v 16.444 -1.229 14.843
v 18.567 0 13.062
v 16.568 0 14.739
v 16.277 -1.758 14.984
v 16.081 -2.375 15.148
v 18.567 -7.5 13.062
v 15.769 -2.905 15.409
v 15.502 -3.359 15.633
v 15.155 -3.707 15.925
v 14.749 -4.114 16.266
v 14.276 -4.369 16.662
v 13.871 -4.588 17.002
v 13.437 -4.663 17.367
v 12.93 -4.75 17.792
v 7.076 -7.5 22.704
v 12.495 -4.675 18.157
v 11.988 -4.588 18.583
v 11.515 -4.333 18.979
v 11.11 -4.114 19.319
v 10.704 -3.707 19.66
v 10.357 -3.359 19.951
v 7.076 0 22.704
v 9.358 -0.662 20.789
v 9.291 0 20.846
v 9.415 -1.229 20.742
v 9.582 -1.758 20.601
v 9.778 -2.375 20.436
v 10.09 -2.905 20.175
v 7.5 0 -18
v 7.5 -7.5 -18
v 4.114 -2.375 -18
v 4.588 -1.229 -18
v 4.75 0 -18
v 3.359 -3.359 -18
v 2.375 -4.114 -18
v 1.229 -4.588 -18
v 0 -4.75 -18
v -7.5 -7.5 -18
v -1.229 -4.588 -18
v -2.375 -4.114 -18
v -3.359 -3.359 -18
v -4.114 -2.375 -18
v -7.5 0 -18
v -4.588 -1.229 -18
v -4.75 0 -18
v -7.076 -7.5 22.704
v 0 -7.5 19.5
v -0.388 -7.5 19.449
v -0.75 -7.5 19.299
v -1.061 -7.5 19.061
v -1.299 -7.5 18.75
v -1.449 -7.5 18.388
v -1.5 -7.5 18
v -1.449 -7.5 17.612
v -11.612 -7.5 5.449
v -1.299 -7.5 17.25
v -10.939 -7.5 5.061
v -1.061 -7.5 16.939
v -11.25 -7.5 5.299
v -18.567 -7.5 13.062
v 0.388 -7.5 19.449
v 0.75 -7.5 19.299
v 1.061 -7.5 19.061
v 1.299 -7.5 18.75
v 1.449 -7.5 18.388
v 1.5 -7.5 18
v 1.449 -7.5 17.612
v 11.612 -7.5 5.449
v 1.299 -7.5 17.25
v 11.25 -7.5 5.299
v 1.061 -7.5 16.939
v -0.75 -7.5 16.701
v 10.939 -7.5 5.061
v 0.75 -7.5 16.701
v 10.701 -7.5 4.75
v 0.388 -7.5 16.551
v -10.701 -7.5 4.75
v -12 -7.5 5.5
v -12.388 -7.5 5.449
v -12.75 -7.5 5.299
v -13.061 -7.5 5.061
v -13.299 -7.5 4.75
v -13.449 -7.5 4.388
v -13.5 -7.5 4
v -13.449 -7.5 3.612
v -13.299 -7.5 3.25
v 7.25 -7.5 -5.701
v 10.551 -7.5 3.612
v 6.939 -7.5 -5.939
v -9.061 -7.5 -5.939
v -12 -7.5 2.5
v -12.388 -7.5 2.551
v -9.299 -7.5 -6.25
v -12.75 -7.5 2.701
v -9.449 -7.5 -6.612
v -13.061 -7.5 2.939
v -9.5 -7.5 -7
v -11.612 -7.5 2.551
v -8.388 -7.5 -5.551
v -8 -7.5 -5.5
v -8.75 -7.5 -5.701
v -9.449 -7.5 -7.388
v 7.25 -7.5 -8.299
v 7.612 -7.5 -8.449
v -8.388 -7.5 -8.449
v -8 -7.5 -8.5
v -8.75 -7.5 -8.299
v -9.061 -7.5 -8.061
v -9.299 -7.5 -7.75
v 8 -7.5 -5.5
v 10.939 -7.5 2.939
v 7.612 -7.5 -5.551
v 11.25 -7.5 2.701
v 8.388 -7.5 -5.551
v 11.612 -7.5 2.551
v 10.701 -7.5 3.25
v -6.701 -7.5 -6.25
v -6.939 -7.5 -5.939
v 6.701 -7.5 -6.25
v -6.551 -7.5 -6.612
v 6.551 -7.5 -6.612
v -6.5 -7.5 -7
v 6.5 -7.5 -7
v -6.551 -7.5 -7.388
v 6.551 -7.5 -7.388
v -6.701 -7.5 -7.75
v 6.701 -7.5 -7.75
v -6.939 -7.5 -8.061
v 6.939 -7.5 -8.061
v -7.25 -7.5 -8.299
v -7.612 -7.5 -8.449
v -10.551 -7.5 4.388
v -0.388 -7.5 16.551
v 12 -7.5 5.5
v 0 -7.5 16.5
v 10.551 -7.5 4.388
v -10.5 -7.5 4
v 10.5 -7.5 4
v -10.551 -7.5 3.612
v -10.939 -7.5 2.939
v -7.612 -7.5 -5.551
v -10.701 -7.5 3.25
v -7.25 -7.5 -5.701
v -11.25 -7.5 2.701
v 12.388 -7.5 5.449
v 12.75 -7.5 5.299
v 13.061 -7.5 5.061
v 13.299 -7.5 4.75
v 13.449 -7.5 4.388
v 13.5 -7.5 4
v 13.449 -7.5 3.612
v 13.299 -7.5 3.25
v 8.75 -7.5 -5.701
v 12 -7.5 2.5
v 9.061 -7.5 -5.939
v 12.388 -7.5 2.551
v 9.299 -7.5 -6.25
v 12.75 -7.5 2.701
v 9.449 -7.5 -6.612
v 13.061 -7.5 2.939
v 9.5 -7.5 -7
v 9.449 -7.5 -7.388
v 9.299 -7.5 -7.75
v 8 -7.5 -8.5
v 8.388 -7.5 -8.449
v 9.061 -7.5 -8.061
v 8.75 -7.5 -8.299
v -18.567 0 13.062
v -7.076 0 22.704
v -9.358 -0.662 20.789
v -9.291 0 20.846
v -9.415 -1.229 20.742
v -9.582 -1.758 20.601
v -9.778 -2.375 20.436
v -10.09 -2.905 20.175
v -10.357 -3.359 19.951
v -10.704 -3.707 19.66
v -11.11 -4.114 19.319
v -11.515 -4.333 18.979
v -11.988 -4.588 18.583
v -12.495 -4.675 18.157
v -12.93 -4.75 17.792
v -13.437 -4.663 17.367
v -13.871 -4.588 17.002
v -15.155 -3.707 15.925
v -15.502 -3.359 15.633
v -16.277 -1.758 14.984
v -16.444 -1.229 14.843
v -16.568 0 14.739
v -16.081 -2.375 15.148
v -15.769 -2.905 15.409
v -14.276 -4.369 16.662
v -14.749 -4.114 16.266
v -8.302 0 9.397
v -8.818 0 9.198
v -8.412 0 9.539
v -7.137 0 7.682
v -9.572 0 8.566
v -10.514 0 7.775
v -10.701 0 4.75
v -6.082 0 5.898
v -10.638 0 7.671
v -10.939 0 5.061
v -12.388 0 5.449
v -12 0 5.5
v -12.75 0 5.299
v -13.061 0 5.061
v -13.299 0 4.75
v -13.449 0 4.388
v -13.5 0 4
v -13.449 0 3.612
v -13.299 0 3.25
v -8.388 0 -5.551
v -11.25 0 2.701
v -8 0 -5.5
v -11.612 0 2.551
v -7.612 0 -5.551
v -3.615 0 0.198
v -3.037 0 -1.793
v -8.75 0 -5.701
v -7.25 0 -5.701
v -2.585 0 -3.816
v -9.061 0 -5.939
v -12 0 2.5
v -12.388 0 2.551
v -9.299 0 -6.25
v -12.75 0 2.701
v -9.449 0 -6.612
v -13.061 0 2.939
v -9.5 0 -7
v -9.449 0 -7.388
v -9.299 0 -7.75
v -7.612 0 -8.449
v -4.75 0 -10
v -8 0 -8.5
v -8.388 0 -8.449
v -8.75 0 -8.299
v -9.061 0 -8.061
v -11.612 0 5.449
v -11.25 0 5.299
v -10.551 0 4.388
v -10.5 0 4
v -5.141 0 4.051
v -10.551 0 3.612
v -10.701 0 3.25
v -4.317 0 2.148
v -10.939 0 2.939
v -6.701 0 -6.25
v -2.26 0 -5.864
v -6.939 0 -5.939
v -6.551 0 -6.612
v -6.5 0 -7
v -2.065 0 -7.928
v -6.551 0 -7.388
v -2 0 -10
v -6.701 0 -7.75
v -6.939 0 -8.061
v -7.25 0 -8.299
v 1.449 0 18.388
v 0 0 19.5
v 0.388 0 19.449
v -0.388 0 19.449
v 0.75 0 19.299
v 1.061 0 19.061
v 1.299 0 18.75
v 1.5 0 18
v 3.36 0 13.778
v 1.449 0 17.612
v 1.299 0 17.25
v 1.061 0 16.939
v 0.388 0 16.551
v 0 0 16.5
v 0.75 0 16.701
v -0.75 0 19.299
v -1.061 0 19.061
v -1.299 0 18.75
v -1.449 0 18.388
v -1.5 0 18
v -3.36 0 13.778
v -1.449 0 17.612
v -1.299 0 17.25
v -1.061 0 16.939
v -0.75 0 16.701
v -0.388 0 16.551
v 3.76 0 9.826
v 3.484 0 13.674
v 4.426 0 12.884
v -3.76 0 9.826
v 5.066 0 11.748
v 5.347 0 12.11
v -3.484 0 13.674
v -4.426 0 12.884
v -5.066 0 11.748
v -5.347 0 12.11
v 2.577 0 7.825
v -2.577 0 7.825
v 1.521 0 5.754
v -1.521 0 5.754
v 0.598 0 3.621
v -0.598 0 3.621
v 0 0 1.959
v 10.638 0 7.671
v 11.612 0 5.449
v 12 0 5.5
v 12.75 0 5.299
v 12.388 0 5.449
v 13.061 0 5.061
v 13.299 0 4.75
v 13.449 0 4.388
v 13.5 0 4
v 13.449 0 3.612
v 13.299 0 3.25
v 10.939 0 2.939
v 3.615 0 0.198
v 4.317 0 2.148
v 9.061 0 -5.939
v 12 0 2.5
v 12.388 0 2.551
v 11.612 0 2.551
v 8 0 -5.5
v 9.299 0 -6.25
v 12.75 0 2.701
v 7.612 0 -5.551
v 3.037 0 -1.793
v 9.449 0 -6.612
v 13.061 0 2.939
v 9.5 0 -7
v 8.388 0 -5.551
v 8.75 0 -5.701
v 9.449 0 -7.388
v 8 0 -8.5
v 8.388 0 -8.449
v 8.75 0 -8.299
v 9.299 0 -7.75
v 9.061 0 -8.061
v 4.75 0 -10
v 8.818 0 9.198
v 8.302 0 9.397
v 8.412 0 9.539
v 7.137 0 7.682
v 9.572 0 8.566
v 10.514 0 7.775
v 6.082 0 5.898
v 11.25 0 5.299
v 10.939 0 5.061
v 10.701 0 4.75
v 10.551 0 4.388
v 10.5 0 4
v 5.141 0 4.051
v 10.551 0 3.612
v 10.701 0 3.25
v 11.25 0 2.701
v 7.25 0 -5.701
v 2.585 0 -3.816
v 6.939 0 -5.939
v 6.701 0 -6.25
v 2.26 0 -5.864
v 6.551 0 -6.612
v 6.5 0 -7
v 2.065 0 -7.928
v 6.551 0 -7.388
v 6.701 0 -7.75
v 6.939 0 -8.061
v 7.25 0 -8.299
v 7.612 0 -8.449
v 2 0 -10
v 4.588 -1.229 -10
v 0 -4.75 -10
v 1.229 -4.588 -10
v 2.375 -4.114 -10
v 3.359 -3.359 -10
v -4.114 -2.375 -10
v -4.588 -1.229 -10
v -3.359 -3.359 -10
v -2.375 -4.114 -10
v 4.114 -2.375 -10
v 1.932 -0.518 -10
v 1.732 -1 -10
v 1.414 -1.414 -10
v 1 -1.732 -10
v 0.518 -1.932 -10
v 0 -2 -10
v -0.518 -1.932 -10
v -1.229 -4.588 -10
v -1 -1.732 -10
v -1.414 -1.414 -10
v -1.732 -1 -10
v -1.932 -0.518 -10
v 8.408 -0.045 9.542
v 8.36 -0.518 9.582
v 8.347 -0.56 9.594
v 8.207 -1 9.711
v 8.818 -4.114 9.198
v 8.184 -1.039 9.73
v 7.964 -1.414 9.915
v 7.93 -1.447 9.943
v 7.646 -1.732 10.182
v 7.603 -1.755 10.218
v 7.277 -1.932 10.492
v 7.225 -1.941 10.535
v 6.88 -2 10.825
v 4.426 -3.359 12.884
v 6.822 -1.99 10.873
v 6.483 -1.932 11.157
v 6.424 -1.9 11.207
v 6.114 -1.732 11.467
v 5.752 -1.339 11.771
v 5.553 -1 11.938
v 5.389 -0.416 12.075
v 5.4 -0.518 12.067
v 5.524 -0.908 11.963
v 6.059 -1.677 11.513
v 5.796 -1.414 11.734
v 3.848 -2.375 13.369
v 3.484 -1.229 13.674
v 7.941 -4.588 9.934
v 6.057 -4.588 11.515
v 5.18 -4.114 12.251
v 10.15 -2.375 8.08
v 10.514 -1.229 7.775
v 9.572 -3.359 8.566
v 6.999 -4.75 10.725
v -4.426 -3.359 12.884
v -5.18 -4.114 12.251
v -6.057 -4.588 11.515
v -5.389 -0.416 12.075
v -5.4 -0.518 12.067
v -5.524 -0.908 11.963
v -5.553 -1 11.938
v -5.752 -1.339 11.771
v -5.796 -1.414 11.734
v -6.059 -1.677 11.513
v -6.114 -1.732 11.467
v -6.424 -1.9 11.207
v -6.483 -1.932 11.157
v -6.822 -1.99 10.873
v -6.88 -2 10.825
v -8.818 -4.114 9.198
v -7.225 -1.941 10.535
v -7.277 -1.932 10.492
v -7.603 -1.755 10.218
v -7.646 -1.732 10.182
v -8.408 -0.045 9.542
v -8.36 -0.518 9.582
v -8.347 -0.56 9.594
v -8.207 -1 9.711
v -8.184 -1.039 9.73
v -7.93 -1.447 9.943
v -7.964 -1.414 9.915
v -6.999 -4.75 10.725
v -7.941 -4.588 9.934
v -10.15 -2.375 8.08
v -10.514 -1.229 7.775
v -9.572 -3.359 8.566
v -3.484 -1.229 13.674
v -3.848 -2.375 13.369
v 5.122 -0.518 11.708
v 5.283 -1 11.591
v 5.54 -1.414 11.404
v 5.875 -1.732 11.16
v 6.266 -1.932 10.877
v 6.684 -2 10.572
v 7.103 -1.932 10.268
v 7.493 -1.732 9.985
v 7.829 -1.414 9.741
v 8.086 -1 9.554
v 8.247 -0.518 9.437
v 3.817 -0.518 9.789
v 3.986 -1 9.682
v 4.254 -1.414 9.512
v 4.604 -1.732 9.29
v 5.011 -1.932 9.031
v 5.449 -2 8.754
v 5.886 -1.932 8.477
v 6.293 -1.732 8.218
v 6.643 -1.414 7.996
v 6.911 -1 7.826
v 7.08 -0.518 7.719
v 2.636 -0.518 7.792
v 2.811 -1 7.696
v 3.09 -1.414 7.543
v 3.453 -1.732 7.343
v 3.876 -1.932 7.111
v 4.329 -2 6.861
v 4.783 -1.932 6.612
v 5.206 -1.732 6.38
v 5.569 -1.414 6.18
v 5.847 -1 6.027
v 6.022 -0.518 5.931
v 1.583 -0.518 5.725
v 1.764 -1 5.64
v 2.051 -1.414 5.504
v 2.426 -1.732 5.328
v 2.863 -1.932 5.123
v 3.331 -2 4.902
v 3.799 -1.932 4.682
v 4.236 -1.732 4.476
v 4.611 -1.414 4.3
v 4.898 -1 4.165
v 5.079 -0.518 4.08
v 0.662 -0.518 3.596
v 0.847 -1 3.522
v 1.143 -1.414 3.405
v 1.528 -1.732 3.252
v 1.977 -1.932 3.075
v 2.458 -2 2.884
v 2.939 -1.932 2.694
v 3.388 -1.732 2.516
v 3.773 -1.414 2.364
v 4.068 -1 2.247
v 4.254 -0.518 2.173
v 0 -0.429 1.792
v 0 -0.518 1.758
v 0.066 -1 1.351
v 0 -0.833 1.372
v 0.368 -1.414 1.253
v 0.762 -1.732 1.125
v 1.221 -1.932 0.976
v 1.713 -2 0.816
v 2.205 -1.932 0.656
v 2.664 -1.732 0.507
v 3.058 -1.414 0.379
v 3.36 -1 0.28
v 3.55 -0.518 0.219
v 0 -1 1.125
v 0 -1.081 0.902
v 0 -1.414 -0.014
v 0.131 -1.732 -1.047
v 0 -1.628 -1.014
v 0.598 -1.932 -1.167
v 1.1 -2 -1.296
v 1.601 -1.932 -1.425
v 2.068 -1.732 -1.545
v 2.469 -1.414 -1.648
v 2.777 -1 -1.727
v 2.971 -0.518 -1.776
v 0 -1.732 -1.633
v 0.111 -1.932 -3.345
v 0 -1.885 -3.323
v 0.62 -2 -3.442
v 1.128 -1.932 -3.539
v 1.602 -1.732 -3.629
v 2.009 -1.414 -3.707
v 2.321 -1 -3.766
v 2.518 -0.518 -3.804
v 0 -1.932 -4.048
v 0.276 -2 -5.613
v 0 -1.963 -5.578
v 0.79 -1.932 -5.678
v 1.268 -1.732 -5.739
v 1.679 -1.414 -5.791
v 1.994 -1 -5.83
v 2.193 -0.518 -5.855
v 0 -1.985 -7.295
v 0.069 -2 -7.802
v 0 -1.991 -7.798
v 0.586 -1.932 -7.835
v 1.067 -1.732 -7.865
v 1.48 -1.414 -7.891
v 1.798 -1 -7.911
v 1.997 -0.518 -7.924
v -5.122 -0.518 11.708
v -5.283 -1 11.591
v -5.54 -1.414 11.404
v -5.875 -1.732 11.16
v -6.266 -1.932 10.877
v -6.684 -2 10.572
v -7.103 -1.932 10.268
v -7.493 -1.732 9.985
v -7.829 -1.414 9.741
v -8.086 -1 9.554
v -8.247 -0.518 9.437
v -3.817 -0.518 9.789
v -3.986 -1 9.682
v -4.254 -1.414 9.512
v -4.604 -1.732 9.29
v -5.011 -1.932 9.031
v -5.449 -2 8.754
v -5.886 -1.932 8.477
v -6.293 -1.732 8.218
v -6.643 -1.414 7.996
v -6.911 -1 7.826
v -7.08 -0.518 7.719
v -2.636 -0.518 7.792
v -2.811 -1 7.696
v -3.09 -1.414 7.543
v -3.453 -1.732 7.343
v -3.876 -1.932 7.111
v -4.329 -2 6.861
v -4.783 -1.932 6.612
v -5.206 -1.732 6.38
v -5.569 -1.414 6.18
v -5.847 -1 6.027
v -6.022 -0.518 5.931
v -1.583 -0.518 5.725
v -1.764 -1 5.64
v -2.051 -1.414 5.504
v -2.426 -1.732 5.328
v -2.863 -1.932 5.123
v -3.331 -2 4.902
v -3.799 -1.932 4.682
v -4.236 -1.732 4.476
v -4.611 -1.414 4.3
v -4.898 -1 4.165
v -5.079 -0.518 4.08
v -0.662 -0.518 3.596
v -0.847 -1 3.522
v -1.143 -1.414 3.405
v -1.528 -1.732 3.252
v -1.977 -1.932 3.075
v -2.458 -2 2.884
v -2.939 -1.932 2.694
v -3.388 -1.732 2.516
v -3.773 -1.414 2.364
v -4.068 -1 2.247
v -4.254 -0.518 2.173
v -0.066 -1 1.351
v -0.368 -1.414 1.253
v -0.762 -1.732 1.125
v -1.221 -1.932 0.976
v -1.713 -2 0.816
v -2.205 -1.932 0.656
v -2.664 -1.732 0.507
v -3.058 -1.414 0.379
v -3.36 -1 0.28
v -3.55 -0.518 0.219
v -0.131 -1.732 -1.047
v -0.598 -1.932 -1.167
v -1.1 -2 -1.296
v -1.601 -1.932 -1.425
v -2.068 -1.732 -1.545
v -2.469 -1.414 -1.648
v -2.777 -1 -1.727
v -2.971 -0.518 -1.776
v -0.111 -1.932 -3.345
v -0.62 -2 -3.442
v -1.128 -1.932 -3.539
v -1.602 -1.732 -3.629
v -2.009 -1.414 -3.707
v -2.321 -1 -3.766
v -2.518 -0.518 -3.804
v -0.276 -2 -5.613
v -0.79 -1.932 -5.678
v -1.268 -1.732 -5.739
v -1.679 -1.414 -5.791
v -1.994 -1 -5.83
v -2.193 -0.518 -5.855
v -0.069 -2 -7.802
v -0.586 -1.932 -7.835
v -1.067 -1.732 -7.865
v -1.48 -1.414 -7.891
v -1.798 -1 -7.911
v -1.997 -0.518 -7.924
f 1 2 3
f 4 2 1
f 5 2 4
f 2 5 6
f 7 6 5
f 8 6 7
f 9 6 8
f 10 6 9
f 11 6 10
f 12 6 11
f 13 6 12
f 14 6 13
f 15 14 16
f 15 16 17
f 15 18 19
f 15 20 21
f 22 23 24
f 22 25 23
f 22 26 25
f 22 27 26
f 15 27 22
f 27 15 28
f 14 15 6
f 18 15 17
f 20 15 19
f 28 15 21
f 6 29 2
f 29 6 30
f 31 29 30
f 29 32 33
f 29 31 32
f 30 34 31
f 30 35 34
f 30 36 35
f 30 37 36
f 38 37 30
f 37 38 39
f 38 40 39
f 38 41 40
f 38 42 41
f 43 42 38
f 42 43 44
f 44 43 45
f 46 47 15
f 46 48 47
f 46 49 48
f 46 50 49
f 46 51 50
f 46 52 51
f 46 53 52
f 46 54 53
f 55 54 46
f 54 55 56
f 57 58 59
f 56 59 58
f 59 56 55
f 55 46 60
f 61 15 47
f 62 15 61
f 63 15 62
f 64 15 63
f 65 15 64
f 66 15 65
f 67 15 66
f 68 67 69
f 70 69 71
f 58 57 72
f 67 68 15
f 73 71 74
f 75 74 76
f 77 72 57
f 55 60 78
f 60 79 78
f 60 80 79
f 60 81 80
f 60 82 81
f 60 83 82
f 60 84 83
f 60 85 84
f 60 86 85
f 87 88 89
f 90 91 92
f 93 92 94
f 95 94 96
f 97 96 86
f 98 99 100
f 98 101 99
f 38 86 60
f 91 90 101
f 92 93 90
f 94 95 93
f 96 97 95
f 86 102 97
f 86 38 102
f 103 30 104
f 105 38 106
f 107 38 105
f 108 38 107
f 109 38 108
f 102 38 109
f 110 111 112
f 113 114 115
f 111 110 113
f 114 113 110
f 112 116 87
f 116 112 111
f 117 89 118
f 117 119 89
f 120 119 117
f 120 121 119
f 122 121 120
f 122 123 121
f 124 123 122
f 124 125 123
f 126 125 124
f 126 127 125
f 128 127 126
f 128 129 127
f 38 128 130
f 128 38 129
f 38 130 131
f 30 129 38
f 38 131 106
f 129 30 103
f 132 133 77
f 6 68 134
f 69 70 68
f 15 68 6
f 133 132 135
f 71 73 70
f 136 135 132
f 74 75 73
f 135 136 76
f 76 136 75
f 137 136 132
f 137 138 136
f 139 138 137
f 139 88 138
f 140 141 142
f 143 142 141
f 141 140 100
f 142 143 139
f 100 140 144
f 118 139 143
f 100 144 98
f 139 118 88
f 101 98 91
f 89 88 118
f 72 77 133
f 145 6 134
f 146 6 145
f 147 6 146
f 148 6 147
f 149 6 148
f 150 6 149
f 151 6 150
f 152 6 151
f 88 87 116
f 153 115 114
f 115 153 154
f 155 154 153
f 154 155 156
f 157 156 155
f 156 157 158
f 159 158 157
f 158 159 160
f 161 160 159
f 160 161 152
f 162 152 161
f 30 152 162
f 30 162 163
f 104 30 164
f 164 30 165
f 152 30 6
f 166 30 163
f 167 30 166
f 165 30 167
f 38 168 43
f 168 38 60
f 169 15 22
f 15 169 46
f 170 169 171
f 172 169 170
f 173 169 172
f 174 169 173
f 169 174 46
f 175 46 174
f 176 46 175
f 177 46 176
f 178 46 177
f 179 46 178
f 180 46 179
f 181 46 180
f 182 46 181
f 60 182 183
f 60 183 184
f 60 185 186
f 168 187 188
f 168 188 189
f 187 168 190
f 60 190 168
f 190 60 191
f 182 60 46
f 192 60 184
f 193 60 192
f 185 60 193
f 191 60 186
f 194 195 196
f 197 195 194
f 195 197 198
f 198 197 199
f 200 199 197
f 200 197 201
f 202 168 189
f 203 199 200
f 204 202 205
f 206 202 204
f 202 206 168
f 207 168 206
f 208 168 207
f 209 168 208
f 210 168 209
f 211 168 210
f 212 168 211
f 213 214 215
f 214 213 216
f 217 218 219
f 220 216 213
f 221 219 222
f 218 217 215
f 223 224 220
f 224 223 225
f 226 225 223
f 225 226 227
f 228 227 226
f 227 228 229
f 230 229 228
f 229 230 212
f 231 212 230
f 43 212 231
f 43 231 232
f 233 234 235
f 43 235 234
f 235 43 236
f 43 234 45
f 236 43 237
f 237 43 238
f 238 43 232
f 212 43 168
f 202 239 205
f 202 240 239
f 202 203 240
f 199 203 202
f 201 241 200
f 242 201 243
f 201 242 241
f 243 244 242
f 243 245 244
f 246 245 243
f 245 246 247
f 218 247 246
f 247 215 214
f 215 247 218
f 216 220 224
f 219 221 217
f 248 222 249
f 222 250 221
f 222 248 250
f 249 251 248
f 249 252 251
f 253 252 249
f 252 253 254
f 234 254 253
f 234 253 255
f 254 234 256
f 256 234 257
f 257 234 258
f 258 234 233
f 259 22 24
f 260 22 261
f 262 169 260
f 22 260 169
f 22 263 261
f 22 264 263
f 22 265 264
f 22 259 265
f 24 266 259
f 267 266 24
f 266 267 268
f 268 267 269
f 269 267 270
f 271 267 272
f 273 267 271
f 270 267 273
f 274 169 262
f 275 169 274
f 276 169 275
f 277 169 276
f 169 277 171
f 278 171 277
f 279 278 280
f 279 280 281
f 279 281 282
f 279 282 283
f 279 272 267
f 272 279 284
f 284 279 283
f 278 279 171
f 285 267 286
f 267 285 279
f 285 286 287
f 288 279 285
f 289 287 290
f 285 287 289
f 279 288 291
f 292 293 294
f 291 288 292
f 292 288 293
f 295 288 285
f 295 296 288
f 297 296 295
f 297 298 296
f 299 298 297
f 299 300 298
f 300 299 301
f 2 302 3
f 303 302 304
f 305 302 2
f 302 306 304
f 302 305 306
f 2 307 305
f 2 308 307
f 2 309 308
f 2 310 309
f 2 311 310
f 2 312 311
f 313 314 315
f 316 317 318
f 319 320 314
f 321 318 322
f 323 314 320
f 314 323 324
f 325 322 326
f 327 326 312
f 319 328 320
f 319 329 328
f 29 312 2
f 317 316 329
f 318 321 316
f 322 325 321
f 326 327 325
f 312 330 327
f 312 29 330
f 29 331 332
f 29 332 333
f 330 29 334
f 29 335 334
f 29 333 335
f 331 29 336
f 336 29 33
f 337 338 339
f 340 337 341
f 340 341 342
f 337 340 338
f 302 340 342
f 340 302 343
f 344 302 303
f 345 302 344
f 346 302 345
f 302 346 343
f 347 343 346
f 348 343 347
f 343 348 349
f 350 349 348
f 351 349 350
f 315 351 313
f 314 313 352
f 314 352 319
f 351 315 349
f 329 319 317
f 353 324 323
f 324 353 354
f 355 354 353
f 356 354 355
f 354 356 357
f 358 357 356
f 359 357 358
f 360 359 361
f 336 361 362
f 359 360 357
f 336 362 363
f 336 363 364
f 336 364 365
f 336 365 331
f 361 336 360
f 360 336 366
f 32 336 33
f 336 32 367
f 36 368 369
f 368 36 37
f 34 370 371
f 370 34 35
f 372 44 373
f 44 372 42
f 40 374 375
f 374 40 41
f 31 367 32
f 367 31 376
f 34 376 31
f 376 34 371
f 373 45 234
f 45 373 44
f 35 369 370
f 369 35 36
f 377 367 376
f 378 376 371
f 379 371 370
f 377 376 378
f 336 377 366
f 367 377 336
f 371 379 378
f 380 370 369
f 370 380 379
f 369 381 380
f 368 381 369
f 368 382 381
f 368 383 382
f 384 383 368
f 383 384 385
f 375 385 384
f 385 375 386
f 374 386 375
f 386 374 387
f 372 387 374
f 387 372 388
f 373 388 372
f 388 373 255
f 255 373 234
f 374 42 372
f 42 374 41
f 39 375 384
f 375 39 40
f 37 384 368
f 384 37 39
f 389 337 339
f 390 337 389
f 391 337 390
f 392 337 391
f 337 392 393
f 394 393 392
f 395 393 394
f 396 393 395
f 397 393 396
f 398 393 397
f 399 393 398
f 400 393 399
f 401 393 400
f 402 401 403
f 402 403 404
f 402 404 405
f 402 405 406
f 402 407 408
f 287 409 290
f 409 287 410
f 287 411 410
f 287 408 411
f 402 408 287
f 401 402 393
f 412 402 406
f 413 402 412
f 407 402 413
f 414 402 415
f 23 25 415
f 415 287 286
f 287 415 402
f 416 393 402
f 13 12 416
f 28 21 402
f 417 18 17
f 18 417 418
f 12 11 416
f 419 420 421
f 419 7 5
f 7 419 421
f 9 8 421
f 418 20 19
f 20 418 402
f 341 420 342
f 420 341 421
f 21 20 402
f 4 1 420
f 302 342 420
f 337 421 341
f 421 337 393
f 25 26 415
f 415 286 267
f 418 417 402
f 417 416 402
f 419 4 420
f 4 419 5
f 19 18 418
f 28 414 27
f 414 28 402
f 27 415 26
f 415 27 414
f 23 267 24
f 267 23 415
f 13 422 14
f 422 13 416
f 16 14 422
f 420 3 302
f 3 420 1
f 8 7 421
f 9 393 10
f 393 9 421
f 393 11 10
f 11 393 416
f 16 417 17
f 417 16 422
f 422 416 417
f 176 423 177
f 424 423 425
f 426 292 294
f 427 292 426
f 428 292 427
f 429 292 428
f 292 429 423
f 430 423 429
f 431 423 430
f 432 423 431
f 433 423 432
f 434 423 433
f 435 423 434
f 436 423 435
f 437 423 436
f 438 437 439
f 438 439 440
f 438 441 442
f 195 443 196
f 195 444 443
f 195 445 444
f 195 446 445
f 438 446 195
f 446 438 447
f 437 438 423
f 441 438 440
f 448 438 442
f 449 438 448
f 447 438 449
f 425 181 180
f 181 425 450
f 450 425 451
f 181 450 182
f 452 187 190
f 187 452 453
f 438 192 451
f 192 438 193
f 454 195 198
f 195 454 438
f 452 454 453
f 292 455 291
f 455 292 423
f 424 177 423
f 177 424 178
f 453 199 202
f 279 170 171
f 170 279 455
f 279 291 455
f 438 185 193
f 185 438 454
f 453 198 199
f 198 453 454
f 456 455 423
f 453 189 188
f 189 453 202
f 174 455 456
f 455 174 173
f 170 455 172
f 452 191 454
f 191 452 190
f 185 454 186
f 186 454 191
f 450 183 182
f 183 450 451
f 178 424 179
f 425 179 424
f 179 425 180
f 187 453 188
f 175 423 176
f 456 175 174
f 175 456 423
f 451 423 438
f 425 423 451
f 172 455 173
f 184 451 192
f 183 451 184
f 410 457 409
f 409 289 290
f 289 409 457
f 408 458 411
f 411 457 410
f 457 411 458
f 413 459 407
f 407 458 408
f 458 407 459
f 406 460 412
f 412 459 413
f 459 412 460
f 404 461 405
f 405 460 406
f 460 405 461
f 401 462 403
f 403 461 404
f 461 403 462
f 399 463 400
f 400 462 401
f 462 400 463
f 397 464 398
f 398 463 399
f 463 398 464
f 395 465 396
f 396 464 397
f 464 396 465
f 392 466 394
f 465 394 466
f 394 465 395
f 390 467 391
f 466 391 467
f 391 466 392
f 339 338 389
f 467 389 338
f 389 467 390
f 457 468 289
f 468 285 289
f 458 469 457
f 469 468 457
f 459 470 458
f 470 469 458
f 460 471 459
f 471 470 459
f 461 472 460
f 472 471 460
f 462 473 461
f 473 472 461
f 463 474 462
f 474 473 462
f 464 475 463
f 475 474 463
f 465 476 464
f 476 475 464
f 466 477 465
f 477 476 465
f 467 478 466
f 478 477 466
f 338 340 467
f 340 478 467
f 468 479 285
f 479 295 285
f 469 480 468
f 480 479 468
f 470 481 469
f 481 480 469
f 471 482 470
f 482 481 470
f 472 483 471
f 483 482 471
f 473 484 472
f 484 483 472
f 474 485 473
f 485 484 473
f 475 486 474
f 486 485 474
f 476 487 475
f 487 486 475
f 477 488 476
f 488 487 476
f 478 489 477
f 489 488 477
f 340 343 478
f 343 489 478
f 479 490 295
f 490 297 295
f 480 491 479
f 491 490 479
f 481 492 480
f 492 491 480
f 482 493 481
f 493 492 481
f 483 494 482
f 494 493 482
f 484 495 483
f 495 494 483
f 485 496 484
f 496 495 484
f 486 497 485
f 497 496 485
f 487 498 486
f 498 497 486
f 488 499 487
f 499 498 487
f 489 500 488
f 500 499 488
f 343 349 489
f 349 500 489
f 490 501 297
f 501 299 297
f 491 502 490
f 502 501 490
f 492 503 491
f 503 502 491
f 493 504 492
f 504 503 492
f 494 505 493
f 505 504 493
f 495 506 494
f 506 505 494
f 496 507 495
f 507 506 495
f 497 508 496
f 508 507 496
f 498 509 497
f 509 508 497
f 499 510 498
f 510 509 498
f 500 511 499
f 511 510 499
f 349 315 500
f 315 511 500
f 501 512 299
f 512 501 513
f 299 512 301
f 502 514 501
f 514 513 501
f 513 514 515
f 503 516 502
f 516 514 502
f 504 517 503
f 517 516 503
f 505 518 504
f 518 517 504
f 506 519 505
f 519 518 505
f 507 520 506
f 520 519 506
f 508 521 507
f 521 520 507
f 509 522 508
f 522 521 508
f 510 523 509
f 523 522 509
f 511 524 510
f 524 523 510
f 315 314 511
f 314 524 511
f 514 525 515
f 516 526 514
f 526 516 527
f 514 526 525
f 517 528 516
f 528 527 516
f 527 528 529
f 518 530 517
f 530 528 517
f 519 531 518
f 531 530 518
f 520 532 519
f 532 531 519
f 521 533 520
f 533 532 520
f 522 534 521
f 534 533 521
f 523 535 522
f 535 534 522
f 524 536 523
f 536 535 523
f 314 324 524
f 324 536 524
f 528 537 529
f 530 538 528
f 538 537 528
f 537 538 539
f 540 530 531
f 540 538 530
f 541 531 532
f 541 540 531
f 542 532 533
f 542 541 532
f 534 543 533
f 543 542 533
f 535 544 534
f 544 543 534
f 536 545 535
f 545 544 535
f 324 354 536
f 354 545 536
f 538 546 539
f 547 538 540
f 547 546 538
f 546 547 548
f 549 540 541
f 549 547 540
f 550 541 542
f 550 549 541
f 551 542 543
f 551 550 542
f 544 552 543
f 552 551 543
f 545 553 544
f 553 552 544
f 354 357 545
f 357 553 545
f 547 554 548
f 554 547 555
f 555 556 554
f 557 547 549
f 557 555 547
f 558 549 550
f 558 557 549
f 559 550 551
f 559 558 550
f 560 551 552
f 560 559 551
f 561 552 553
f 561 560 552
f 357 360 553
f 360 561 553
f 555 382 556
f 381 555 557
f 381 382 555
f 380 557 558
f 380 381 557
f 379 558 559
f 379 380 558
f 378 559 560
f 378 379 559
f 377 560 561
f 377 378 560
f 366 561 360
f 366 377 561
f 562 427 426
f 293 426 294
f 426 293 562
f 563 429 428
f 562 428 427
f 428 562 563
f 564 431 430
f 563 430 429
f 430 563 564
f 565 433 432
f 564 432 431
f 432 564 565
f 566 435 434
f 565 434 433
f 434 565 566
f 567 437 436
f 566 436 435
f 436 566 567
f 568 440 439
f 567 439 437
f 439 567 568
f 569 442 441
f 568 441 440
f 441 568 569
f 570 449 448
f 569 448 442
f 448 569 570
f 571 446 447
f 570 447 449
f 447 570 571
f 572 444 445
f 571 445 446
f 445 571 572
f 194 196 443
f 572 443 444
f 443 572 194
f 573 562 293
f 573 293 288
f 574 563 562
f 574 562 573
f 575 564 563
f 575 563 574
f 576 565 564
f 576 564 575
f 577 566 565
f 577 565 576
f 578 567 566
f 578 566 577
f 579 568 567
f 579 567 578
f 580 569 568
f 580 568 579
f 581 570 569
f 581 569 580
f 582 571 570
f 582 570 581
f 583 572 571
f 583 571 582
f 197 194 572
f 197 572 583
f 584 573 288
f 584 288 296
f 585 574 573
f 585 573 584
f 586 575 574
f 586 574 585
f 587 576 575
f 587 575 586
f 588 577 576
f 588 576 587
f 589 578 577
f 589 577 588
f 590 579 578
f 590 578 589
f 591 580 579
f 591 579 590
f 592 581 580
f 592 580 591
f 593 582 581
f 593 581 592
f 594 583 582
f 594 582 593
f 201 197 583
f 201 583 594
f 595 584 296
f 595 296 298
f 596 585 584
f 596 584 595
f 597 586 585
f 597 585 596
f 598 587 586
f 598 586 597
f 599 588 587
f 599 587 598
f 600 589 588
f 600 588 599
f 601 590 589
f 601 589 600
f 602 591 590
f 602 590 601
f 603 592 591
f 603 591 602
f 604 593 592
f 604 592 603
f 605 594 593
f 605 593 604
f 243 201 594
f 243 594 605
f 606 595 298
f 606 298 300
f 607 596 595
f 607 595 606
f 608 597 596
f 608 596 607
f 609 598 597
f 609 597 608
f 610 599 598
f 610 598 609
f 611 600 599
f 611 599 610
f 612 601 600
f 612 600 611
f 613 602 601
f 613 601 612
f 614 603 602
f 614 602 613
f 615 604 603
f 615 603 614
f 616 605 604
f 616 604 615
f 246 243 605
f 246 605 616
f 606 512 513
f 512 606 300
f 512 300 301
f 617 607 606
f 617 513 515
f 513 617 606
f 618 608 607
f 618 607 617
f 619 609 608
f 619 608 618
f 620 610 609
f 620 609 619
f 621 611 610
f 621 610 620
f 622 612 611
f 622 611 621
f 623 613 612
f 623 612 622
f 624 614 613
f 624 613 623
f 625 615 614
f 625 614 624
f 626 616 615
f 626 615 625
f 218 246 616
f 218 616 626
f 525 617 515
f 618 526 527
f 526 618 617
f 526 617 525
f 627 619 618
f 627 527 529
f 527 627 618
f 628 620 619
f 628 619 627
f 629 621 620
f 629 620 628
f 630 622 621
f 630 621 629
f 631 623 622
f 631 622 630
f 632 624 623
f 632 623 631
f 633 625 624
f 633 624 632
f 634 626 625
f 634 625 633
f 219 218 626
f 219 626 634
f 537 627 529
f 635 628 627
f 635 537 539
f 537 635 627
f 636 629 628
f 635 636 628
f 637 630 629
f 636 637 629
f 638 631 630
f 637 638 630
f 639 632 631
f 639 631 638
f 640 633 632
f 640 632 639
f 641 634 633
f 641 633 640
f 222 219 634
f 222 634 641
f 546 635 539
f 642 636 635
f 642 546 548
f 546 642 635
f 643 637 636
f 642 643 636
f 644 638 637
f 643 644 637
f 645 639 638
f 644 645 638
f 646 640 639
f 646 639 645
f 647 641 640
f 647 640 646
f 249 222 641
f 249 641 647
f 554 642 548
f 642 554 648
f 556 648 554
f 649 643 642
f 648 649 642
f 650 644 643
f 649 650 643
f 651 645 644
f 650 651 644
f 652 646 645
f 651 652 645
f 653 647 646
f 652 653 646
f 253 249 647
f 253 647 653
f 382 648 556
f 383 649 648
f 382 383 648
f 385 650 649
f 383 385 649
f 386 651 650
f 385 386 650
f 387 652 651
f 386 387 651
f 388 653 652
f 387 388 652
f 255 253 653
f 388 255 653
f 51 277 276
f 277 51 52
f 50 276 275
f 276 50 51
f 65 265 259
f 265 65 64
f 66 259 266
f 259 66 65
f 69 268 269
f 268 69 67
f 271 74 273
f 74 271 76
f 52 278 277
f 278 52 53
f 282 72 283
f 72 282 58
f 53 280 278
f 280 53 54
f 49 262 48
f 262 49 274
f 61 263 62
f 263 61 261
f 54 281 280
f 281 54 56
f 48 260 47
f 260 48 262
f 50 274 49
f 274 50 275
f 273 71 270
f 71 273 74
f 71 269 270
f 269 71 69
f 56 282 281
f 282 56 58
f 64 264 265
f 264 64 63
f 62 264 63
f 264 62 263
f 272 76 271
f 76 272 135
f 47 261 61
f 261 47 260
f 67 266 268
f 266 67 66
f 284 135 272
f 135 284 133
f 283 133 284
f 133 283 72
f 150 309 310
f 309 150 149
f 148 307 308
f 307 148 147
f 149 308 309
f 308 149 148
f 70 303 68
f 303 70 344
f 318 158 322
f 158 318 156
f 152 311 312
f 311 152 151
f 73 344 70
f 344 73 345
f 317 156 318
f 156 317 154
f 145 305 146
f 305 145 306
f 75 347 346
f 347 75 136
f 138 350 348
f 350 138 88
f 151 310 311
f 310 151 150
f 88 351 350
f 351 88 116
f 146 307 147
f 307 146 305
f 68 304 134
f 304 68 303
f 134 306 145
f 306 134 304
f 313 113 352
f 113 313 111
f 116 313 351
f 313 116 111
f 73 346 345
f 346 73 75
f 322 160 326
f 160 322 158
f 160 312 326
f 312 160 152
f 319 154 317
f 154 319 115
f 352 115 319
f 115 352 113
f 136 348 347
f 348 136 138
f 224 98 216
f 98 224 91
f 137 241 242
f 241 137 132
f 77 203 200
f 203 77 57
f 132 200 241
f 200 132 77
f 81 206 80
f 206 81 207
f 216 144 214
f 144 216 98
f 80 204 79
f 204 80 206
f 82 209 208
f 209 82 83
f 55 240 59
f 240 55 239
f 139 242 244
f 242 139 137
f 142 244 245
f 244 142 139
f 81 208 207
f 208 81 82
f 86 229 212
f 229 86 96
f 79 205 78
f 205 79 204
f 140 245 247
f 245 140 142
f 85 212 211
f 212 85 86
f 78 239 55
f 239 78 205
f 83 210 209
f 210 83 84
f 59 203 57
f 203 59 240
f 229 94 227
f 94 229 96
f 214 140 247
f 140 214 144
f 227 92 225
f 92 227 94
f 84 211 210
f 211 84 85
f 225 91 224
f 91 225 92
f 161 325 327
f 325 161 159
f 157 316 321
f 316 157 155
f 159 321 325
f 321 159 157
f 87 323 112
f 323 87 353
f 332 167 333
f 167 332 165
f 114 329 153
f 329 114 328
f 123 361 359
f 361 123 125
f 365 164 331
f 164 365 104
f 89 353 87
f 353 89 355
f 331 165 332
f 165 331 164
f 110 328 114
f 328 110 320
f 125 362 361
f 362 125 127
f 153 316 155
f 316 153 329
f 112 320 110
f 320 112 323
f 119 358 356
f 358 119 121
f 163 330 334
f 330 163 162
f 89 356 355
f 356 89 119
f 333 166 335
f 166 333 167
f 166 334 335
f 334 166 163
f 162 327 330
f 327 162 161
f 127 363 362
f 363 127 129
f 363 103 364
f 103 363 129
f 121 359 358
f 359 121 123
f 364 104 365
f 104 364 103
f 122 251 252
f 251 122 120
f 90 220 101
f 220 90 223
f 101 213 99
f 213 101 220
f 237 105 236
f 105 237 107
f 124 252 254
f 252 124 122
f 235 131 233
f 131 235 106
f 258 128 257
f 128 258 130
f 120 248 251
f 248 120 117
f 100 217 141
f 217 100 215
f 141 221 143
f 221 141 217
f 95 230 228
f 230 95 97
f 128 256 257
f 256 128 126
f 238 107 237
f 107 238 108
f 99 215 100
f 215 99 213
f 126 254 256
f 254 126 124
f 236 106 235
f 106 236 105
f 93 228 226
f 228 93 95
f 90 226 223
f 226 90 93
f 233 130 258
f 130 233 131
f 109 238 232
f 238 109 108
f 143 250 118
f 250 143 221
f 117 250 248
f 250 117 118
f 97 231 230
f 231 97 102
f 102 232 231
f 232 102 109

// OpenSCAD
difference(){
hull(){
translate([25/2,0,35/2])rotate([0,40,0])cube([15,15,1],center=true);
translate([-25/2,0,35/2])rotate([0,-40,0])cube([15,15,1],center=true);

translate([0,0,-35/2])cube([15,15,1],center=true);
}
translate([-25,0,-25])cube([50,50,50]);



translate([0,0,-30])cylinder(r=9.5/2,h=12+8,$fn=24);
translate([-2,0,0])rotate([0,40,0])translate([0,0,32-8])cylinder(r=9.5/2,h=12+8,$fn=24,center=true);
translate([2,0,0])rotate([0,-40,0])translate([0,0,32-8])cylinder(r=9.5/2,h=12+8,$fn=24,center=true);

mirror([1,0,0])tubo();
tubo();



translate([0,0,18])rotate([90,0,0])cylinder(r=3/2,h=20,$fn=24,center=true);
translate([12,0,4])rotate([90,0,0])cylinder(r=3/2,h=20,$fn=24,center=true);
translate([-12,0,4])rotate([90,0,0])cylinder(r=3/2,h=20,$fn=24,center=true);
translate([8,0,-7])rotate([90,0,0])cylinder(r=3/2,h=20,$fn=24,center=true);
translate([-8,0,-7])rotate([90,0,0])cylinder(r=3/2,h=20,$fn=24,center=true);
}
module tubo(){
translate([-35,0,-10])
rotate([90,0,0])
rotate_extrude(convexity = 10, $fn = 100)
translate([35, 0, 0])
circle(r = 2,$fn=24);
}
